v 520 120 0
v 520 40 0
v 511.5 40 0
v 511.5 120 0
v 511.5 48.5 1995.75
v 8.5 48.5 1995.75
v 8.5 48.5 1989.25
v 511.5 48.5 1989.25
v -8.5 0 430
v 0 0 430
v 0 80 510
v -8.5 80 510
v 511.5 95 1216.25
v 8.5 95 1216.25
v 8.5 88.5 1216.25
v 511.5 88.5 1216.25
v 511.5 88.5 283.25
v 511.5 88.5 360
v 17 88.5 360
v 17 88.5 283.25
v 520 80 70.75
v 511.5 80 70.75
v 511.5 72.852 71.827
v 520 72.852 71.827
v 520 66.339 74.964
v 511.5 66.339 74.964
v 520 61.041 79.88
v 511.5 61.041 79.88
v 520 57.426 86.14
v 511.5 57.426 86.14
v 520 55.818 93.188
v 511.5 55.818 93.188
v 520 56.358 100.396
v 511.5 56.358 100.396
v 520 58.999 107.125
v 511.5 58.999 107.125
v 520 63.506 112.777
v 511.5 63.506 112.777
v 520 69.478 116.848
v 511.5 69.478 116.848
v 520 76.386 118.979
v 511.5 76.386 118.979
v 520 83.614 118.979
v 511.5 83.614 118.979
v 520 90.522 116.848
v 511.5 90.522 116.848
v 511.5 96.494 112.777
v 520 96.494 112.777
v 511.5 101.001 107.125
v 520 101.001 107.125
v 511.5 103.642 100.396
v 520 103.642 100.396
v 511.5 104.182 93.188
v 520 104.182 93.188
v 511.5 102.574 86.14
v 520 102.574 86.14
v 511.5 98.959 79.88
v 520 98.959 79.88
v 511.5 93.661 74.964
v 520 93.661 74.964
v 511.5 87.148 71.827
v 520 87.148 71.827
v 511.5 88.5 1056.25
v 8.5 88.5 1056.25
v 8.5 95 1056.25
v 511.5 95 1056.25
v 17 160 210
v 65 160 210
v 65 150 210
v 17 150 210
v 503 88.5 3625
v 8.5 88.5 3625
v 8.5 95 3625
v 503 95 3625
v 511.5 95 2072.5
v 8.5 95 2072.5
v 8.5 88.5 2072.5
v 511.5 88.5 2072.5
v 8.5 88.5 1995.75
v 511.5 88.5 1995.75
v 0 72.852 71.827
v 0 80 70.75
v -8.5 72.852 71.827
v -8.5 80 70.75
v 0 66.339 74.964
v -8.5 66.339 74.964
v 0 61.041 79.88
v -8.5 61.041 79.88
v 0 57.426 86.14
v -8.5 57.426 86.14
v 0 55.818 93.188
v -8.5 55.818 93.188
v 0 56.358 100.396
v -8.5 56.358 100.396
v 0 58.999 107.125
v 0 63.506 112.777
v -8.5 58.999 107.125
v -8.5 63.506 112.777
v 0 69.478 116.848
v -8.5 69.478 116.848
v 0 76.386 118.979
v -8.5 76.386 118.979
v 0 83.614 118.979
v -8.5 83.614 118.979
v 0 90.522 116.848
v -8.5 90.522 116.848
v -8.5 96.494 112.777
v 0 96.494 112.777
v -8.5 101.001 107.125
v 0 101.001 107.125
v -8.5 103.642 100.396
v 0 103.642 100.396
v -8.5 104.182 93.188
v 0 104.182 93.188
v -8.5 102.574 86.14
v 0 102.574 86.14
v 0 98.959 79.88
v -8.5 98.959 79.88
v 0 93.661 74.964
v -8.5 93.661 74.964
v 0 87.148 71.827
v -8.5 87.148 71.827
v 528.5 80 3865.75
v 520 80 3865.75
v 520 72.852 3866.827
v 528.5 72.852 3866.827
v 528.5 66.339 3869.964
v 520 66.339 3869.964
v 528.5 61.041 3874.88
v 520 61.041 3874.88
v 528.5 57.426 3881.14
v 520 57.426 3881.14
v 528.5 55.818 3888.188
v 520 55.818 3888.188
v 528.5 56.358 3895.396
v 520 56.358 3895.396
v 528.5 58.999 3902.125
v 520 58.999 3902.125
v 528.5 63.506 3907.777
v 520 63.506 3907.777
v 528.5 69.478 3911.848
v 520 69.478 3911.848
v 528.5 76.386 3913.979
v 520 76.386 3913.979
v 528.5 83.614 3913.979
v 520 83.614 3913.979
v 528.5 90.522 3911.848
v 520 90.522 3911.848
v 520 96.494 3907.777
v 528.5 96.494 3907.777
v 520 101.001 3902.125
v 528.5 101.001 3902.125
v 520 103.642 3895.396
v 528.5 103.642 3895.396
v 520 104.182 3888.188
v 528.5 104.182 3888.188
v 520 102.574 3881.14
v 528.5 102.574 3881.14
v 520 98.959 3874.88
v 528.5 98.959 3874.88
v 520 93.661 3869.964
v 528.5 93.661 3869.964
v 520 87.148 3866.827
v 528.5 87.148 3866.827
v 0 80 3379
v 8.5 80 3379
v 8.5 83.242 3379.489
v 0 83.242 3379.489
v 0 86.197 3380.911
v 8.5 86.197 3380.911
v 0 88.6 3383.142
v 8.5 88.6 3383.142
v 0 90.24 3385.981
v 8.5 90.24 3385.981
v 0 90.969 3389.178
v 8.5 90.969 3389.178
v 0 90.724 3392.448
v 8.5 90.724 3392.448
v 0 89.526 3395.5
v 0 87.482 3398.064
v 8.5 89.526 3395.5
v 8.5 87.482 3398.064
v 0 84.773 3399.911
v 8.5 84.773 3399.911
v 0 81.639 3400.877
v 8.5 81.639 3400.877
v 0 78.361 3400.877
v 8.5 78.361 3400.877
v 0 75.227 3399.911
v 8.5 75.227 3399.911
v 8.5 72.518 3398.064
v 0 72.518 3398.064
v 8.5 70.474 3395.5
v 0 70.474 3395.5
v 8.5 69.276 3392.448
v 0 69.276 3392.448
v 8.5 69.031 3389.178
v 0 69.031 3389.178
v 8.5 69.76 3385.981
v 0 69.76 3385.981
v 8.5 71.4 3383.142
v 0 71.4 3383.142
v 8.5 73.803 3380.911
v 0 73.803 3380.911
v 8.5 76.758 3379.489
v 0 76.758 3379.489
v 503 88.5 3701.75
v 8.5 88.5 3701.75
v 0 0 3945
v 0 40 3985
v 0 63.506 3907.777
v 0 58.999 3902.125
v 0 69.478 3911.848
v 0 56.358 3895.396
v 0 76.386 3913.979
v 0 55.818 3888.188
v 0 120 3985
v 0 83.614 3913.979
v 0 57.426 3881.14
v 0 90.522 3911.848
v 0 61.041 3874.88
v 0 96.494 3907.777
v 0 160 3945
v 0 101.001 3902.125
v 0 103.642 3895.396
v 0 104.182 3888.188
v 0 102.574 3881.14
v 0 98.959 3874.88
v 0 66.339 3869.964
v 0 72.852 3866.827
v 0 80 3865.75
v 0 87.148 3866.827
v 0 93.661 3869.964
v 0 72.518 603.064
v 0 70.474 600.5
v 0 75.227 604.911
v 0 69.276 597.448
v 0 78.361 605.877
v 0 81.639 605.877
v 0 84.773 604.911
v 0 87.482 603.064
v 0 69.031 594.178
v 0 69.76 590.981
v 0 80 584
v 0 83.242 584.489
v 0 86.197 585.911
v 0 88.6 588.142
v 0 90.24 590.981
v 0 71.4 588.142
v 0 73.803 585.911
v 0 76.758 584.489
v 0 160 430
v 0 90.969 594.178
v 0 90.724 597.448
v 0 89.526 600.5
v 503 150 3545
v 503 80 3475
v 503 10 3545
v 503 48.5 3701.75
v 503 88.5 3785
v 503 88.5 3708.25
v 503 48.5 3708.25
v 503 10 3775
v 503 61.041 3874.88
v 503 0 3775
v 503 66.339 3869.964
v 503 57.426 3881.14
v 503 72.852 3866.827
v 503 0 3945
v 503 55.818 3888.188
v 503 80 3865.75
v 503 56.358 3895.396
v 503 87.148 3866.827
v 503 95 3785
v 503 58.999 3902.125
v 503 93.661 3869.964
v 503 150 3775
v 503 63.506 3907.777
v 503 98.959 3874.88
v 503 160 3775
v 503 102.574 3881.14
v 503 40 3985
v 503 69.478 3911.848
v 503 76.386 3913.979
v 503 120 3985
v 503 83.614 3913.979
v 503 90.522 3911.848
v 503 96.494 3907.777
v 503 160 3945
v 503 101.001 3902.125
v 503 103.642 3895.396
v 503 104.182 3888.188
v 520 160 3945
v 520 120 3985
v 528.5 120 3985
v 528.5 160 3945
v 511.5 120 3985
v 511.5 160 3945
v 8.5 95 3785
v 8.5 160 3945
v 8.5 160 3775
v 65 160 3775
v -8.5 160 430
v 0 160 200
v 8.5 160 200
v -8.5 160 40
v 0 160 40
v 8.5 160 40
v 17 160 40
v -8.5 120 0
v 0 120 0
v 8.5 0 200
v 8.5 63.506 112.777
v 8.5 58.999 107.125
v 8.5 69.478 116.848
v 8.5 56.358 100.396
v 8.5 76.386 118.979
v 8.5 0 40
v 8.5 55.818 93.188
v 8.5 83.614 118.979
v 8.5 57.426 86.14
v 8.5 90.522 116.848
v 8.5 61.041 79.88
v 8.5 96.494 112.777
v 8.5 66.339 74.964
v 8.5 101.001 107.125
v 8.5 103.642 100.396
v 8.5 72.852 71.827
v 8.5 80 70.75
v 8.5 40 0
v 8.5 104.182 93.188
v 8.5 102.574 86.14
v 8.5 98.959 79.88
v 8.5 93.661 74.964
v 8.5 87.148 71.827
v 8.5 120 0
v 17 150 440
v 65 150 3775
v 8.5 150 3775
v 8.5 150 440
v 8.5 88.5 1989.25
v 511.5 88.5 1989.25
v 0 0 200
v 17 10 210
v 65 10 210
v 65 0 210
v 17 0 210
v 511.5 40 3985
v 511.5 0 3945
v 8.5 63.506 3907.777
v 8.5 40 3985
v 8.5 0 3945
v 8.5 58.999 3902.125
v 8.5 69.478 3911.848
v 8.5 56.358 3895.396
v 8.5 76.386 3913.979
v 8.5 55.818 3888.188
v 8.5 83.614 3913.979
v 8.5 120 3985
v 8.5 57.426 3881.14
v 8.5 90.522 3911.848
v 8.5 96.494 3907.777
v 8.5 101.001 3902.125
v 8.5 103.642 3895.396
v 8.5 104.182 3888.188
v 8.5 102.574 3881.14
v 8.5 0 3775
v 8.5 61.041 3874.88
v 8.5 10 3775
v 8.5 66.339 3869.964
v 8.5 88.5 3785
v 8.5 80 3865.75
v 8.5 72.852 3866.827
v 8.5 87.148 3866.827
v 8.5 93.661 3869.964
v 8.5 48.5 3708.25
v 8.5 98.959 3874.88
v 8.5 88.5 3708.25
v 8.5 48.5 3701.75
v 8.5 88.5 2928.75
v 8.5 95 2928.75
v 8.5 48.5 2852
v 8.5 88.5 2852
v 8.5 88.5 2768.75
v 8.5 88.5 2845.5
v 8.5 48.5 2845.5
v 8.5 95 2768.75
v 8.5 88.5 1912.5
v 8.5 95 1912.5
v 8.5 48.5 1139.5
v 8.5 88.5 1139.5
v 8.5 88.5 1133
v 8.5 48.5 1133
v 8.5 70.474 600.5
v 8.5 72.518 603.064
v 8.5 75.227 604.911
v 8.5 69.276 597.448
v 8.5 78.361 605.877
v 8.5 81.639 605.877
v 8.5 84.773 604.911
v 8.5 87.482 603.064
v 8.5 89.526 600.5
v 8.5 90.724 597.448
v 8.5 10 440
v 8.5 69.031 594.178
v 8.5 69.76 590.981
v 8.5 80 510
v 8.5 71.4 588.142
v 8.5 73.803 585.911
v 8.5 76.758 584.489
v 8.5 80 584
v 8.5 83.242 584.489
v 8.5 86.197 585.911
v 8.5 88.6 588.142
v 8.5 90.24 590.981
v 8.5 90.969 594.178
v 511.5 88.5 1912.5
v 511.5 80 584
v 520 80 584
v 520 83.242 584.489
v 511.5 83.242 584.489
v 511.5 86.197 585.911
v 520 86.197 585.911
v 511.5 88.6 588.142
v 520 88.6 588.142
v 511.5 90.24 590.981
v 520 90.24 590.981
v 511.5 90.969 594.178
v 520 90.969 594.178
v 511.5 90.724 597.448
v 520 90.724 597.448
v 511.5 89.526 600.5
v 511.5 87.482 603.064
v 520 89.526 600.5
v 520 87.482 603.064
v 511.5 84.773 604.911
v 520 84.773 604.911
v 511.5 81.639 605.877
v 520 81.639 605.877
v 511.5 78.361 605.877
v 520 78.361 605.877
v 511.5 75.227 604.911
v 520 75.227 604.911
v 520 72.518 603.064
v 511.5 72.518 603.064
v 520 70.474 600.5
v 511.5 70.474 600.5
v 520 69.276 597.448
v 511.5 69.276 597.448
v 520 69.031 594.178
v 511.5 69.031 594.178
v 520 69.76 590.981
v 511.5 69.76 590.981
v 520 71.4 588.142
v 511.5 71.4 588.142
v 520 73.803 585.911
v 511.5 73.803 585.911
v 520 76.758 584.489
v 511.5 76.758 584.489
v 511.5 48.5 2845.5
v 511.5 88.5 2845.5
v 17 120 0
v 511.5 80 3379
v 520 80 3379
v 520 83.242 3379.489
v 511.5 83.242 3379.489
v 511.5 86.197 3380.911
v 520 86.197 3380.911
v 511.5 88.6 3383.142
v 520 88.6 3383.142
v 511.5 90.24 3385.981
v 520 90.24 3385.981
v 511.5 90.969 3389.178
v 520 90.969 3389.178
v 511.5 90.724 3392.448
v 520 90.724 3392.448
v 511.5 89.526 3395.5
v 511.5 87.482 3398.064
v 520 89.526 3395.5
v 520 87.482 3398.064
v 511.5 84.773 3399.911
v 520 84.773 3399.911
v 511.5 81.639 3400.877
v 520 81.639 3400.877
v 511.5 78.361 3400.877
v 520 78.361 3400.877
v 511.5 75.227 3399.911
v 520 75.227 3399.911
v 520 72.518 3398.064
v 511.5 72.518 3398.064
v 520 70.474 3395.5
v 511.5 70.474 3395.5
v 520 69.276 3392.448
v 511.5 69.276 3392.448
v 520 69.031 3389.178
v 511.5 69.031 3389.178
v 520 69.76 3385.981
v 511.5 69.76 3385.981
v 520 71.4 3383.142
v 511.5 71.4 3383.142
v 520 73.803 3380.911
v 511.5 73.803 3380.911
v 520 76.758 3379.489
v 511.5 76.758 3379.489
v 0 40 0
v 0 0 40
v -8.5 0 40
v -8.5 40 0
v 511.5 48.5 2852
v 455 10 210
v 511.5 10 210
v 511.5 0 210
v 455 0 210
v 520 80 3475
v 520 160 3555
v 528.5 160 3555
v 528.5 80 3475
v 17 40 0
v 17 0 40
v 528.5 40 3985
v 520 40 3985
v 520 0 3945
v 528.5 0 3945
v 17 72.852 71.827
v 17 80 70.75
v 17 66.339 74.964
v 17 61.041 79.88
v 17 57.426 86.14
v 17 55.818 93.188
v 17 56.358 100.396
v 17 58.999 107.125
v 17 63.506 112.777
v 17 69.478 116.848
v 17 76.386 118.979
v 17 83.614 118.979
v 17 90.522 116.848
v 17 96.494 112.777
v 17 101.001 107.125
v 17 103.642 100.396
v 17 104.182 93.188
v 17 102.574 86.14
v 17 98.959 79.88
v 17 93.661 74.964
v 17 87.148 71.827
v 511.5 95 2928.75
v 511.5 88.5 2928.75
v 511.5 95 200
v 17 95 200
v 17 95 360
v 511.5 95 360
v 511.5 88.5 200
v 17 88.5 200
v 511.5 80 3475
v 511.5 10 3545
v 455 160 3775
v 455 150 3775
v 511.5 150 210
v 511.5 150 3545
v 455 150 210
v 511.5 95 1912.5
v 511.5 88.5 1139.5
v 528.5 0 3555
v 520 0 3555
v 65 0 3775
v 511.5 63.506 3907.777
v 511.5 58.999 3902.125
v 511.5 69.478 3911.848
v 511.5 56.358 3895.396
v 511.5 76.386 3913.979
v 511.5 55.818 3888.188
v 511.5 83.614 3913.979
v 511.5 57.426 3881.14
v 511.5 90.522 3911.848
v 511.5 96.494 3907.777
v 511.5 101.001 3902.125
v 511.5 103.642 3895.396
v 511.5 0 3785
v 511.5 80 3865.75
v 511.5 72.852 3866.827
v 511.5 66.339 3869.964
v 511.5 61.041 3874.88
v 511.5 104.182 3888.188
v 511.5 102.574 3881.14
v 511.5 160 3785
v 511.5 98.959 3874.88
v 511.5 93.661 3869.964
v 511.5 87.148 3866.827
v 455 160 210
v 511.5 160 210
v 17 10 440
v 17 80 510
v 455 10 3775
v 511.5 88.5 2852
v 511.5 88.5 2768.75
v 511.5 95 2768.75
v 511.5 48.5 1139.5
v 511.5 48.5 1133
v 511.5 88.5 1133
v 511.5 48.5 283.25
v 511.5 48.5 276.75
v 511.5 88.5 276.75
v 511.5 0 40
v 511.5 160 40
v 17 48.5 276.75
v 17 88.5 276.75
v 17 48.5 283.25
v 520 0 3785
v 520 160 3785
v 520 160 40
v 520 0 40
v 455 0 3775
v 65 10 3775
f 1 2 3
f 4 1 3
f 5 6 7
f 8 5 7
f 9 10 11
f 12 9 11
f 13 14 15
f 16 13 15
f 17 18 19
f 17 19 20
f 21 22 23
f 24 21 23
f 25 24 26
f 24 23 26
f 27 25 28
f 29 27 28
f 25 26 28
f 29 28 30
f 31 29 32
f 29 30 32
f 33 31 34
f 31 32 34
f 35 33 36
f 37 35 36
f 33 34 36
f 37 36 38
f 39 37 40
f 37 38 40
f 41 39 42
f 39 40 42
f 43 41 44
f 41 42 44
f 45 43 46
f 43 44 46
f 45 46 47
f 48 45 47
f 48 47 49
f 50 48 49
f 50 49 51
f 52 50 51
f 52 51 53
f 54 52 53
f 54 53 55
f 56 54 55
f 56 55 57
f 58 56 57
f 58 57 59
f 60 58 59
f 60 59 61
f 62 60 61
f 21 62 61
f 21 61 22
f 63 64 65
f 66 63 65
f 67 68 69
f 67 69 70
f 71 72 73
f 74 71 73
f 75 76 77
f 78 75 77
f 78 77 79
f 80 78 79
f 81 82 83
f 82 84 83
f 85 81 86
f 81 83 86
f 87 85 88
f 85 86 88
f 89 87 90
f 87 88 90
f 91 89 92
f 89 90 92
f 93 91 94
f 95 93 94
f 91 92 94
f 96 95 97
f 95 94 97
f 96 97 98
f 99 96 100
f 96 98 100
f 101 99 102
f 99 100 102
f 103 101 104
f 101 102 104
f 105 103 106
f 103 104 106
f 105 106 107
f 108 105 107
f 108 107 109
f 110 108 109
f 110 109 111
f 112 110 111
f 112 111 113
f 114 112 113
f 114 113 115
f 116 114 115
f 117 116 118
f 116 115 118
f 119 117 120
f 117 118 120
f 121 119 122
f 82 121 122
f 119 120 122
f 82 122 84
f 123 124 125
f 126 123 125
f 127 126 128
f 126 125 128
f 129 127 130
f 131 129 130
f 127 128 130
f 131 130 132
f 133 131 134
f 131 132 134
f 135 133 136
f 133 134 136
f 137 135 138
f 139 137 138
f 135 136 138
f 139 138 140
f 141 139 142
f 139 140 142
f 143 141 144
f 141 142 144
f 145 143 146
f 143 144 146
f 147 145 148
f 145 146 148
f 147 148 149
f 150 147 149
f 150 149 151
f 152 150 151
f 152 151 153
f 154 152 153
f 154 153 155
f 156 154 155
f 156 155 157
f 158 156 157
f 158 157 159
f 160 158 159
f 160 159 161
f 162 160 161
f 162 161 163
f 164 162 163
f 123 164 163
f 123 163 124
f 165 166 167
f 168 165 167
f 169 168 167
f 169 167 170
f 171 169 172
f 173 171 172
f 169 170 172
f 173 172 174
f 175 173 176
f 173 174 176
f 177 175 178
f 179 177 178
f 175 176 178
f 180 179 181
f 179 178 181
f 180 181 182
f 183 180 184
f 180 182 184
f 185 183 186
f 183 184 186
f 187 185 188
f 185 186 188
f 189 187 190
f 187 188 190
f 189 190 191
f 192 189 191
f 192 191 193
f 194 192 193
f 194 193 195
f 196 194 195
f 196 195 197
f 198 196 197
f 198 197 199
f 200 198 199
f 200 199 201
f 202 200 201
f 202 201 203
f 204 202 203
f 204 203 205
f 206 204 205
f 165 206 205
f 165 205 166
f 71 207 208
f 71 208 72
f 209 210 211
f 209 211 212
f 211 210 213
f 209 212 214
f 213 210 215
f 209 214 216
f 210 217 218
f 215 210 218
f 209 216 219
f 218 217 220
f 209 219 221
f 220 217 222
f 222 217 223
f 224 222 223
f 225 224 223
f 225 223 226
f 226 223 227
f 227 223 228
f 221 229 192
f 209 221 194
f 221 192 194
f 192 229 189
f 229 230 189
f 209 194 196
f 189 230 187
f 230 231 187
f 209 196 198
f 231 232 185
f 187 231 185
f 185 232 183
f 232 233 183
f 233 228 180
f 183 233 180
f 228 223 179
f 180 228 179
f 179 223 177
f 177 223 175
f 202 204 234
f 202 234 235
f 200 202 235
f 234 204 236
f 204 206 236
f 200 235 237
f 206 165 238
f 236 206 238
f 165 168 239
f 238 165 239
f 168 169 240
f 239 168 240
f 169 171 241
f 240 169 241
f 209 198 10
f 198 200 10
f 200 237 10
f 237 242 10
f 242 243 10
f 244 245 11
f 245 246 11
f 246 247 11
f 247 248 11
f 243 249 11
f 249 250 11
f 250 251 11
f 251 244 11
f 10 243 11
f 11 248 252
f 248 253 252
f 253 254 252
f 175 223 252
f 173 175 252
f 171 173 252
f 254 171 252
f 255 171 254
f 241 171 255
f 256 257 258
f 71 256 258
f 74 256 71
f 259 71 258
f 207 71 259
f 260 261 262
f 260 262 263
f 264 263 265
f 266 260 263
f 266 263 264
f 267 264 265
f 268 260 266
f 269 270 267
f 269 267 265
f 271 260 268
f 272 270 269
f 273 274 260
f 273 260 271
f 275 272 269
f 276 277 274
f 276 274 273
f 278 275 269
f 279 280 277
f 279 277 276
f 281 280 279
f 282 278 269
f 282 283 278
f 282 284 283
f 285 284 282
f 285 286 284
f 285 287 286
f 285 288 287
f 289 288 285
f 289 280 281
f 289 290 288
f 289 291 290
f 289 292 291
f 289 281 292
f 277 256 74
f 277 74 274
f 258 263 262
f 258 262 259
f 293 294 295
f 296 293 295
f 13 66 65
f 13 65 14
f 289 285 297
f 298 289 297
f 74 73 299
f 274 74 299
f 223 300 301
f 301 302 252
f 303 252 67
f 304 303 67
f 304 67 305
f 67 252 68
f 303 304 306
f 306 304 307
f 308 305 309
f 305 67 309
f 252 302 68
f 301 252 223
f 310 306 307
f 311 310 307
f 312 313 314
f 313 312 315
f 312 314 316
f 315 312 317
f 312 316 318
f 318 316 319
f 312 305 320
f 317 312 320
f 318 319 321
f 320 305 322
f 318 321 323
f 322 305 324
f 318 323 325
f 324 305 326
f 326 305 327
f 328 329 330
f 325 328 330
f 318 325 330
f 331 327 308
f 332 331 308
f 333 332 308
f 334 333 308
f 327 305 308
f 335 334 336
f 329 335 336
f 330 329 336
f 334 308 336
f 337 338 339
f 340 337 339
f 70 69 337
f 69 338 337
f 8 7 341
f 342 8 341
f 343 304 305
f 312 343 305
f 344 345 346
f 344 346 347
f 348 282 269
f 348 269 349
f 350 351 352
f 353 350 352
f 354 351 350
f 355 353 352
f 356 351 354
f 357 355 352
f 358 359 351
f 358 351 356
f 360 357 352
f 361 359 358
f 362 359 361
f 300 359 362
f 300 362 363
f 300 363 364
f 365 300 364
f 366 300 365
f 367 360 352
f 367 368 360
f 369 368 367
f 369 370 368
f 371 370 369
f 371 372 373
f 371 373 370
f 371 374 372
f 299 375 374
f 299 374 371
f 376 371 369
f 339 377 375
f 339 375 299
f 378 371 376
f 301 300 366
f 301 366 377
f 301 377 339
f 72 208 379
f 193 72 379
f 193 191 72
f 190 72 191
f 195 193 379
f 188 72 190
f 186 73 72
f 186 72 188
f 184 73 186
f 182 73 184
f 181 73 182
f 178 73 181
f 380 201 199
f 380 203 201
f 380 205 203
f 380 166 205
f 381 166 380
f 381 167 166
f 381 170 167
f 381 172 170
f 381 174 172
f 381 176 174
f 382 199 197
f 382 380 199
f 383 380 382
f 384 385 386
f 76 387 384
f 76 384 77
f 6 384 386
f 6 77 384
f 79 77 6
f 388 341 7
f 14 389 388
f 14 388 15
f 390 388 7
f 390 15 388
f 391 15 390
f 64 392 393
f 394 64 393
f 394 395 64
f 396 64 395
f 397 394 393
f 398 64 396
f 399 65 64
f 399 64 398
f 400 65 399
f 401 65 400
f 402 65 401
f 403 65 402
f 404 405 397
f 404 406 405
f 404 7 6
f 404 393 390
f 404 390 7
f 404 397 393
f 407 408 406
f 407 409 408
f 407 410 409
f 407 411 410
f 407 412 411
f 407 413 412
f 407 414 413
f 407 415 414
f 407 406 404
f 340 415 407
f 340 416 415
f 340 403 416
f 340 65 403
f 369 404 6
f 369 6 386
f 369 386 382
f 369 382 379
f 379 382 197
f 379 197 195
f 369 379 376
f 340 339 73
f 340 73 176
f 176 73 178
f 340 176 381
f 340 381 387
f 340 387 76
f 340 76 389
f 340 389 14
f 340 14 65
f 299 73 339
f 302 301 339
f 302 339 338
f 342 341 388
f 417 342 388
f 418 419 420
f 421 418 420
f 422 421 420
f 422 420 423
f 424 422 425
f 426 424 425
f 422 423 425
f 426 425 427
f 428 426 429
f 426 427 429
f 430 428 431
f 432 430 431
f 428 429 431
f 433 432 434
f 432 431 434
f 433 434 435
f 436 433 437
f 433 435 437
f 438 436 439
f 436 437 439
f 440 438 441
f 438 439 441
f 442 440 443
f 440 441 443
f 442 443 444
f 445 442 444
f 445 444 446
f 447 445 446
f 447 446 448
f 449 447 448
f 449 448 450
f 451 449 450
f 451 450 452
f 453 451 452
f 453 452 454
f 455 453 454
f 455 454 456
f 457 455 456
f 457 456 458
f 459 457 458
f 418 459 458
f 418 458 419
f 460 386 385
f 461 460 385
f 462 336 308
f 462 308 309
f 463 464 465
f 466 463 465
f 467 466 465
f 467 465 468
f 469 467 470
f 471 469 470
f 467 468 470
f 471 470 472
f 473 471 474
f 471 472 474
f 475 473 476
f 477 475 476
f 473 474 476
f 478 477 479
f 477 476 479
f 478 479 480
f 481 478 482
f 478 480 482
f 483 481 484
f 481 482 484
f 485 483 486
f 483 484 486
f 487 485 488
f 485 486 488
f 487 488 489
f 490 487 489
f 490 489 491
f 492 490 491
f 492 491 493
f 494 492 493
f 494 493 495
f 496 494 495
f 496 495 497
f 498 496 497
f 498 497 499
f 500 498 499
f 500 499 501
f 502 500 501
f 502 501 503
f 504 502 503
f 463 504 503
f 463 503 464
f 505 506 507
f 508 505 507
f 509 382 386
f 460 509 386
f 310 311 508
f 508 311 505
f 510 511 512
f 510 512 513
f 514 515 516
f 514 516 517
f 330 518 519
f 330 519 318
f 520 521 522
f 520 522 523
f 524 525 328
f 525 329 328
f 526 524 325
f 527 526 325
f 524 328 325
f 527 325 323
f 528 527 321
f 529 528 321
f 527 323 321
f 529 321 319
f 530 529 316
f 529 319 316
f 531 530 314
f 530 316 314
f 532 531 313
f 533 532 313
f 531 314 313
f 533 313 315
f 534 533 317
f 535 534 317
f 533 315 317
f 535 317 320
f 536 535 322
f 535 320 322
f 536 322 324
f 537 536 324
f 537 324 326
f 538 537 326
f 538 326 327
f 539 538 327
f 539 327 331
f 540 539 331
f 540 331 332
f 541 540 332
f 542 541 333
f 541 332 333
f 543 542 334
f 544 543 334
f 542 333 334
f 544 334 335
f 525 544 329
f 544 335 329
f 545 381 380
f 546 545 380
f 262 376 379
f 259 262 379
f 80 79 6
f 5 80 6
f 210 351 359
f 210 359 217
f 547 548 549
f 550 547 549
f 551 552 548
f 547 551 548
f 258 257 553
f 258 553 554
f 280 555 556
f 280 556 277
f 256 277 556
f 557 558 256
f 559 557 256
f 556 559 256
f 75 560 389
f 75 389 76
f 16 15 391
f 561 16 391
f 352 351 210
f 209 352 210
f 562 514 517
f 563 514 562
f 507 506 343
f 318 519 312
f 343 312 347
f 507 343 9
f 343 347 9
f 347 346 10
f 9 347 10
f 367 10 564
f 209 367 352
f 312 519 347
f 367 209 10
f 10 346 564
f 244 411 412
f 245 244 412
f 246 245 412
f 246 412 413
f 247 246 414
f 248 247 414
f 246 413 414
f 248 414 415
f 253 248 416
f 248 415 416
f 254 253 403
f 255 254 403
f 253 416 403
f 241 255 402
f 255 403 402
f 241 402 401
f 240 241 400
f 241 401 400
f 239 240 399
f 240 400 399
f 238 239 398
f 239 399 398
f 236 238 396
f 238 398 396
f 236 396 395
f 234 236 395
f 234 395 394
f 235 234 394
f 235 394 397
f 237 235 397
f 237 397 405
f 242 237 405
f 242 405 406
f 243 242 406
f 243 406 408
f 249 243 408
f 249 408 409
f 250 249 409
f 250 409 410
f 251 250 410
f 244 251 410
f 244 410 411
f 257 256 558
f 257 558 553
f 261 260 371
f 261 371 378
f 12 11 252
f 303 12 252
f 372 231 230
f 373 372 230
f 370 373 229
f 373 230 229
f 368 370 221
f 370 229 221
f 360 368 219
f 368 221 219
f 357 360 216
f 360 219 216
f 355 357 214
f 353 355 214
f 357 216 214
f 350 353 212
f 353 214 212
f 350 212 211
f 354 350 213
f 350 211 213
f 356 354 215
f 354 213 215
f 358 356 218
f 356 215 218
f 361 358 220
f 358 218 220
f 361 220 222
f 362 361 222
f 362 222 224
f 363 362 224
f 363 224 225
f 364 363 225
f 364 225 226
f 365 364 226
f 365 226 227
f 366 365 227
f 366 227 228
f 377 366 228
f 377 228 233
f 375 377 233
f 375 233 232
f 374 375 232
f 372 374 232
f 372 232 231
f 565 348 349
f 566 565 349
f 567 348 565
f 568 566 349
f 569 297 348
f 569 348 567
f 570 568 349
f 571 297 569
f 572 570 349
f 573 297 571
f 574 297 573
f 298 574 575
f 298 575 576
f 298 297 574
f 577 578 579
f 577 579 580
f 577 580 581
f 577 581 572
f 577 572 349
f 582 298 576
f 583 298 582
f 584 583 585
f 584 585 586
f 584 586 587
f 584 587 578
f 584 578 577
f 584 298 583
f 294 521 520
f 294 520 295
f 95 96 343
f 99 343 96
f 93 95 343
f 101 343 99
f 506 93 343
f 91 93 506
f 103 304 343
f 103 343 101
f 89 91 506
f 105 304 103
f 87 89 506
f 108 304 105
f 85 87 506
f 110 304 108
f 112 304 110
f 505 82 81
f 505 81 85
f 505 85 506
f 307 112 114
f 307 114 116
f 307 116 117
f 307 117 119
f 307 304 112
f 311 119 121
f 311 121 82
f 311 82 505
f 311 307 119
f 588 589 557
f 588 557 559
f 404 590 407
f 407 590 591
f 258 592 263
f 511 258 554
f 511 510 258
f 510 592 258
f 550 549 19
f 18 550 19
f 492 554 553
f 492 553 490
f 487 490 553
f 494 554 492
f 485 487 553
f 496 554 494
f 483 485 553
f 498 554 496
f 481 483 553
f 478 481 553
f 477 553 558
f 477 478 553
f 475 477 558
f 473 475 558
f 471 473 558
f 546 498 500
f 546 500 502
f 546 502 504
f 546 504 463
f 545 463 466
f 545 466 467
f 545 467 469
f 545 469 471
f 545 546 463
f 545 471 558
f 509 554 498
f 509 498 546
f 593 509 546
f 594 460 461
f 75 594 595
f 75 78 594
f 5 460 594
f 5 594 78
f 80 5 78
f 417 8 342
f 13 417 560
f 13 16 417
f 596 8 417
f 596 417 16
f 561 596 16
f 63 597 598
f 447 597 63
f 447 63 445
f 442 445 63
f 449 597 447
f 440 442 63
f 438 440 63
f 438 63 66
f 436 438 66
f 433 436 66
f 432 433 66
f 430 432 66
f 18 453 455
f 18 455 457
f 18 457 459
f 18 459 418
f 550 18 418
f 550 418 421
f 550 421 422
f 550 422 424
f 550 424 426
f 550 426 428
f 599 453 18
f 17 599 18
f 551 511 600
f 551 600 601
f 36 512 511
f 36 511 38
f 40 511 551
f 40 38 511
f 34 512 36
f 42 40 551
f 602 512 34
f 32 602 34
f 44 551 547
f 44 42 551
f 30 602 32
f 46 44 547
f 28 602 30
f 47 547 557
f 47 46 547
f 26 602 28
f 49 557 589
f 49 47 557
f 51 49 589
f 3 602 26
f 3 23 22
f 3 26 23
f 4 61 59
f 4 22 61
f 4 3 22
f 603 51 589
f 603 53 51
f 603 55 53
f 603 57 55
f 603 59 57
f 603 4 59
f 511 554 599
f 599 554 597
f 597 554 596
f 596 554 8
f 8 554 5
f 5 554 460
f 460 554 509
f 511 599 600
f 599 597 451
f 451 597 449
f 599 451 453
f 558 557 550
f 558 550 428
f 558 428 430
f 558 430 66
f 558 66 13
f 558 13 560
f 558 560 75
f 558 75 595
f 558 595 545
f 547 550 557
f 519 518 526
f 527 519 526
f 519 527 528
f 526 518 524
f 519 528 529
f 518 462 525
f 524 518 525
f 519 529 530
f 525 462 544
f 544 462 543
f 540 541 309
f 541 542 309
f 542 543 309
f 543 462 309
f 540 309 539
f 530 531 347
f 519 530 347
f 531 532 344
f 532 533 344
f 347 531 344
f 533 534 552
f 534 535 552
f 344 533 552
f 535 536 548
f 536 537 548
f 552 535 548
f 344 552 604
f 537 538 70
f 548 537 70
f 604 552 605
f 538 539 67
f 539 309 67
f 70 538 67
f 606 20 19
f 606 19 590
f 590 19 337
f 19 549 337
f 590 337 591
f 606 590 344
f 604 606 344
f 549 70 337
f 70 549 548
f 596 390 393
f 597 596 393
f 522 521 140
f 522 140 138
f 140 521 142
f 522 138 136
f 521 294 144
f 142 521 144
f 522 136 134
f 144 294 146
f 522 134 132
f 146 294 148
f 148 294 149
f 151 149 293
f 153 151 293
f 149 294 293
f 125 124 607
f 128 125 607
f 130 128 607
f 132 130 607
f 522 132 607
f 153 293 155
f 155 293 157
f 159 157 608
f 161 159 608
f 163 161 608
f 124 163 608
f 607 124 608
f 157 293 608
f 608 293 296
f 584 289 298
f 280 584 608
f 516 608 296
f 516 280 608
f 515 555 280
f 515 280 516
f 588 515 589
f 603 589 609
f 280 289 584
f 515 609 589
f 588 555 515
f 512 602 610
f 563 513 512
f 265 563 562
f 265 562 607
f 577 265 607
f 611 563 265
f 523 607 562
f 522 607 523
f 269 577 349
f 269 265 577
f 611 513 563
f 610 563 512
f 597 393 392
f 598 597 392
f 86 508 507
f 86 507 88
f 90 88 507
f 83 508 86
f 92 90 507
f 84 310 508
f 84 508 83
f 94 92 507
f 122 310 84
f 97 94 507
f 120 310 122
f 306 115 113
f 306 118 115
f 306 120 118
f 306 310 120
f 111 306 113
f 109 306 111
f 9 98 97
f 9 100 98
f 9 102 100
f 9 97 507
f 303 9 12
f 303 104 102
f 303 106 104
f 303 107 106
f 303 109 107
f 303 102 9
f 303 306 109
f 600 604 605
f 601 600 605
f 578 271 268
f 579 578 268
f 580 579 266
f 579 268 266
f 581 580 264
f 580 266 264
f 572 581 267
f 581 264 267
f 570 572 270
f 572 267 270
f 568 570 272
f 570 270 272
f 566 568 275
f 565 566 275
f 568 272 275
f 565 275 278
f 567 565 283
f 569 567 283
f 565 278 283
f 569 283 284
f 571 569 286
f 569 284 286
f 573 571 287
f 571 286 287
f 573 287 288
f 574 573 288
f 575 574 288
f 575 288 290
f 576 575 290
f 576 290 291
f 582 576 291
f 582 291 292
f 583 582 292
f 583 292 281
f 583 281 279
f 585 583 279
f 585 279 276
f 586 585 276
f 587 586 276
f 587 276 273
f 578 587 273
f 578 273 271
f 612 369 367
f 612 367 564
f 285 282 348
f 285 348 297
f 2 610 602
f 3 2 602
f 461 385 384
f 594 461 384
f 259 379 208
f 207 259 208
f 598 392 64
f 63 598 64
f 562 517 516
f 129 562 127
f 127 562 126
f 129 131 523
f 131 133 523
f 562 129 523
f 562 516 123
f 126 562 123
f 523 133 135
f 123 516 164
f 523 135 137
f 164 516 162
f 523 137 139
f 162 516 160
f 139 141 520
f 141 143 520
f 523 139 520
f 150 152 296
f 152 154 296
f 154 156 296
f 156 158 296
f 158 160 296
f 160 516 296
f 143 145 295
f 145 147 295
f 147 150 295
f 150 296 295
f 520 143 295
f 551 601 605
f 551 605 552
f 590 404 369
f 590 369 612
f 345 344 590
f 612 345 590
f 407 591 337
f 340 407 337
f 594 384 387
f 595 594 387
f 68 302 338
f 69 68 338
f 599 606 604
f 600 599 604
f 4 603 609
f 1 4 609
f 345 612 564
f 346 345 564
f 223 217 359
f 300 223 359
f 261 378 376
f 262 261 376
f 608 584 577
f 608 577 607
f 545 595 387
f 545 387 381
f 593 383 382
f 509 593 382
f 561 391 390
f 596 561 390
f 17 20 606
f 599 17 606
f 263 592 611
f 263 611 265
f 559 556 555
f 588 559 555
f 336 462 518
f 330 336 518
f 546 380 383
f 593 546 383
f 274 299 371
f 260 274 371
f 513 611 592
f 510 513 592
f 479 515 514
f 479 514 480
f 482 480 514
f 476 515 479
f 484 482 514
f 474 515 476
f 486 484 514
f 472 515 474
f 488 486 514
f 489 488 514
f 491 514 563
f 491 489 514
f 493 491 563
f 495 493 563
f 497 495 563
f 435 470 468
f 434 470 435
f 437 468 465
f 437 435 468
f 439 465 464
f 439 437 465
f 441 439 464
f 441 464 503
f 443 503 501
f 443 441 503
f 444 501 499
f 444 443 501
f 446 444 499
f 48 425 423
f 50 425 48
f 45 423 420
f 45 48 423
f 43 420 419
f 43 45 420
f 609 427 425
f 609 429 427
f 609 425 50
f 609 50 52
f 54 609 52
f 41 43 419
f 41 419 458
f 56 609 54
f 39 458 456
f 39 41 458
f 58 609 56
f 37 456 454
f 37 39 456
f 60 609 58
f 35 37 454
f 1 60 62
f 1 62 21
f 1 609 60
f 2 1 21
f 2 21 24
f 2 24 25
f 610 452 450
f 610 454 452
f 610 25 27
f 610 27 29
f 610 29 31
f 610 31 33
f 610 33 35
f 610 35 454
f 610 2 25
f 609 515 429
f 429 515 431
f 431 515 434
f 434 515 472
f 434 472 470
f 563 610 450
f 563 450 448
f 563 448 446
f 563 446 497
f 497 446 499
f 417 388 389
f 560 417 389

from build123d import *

# Parameters (mm, degrees)
EXTRUDE_1_DEPTH        = 3985
EXTRUDE_1_2_DEPTH      = 3985
EXTRUDE_3_DEPTH        = 520
SKETCH_6_W             = 503
SKETCH_6_H             = 200
CUT_EXTRUDE_4_DEPTH    = 4022.96780196
PATTERN_LINEAR_1_COUNT = 5
PATTERN_LINEAR_1_PITCH = 856.25
EXTRUDE_11_DEPTH       = 8.5
PATTERN_LINEAR_2_COUNT = 2
PATTERN_LINEAR_2_PITCH = 17
SKETCH_22_W            = 8.5
SKETCH_22_H            = 200
CUT_EXTRUDE_12_DEPTH   = 4024.075595859
SKETCH_23_R            = 24.25
CUT_EXTRUDE_13_DEPTH   = 4024.075595859
EXTRUDE_14_DEPTH       = 8.5
PATTERN_LINEAR_3_COUNT = 2
PATTERN_LINEAR_3_PITCH = 17
SKETCH_27_W            = 8.5
SKETCH_27_H            = 200
CUT_EXTRUDE_15_DEPTH   = 4024.075595859
SKETCH_28_R            = 24.25
CUT_EXTRUDE_16_DEPTH   = 4025.201038716
SKETCH_29_W            = 494.5
SKETCH_29_H            = 10
CUT_EXTRUDE_17_DEPTH   = 10
SKETCH_30_W            = 494.5
SKETCH_30_H            = 10
CUT_EXTRUDE_18_DEPTH   = 10
SKETCH_31_R            = 11
CUT_EXTRUDE_19_DEPTH   = 4024.075595859
CHAMFER_1_SIZE         = 40


with BuildPart() as part:
    # 草图2 → 拉伸1 (new body)
    with BuildSketch(Plane.XY):
        Polygon((0, 0), (0, 160), (65, 160), (65, 150), (8.5, 150), (8.5, 10), (65, 10), (65, 0), align=None)
    extrude(amount=EXTRUDE_1_DEPTH)



with BuildPart() as body_2:
    # 草图2 → Extrude 1 2 (new body)
    with BuildSketch(Plane.XY):
        Polygon((455, 160), (520, 160), (520, 0), (455, 0), (455, 10), (511.5, 10), (511.5, 150), (455, 150), align=None)
    extrude(amount=EXTRUDE_1_2_DEPTH)


with BuildPart() as part_1:
    add(part.part)

    add(body_2.part)  # 拉伸3 merges body 2
    # 草图5 → 拉伸3 (add)
    with BuildSketch(Plane.ZY):
        Polygon((200, 95), (360, 95), (360, 88.5), (283.25, 88.5), (283.25, 48.5), (276.75, 48.5), (276.75, 88.5), (200, 88.5), align=None)
    extrude_3 = extrude(amount=-EXTRUDE_3_DEPTH)

    # 草图6 → 拉伸4 (cut, through all)
    with BuildSketch(Plane(origin=(0, 160, 0), x_dir=(1, 0, 0), z_dir=(0, 1, 0))):
        with Locations((260, -100)):
            Rectangle(SKETCH_6_W, SKETCH_6_H)
        with Locations((260, -3885)):
            Rectangle(SKETCH_6_W, SKETCH_6_H)
    extrude(amount=-CUT_EXTRUDE_4_DEPTH, mode=Mode.SUBTRACT)

    # 阵列(线性)1: 拉伸3 ×5
    with Locations(*[(0, 0, i * PATTERN_LINEAR_1_PITCH) for i in range(1, PATTERN_LINEAR_1_COUNT)]):
        add(extrude_3)

    # 草图19 → 拉伸11 (add)
    with BuildSketch(Plane(origin=(520, 0, 0), x_dir=(0, 0, -1), z_dir=(1, 0, 0))):
        Polygon((-3985, 160), (-3555, 160), (-3475, 80), (-3555, 0), (-3985, 0), align=None)
    extrude_11 = extrude(amount=EXTRUDE_11_DEPTH)

    # 阵列(线性)2: 拉伸11 ×2
    with Locations(*[(-i * PATTERN_LINEAR_2_PITCH, 0, 0) for i in range(1, PATTERN_LINEAR_2_COUNT)]):
        add(extrude_11)

    # 草图22 → 拉伸12 (cut, through all)
    with BuildSketch(Plane(origin=(0, 160, 0), x_dir=(1, 0, 0), z_dir=(0, 1, 0))):
        with Locations((515.75, -3885)):
            Rectangle(SKETCH_22_W, SKETCH_22_H)
    extrude(amount=-CUT_EXTRUDE_12_DEPTH, mode=Mode.SUBTRACT)

    # 草图23 → 拉伸13 (cut, through all)
    with BuildSketch(Plane.ZY):
        with Locations(Location((95, 80, 0), (0, 0, 180))):
            Circle(SKETCH_23_R)
        with Locations(Location((3890, 80, 0), (0, 0, 180))):
            Circle(SKETCH_23_R)
    extrude(amount=-CUT_EXTRUDE_13_DEPTH, mode=Mode.SUBTRACT)

    # 草图26 → 拉伸14 (add)
    with BuildSketch(Plane.ZY):
        Polygon((0, 160), (0, 0), (430, 0), (510, 80), (430, 160), align=None)
    extrude_14 = extrude(amount=EXTRUDE_14_DEPTH)

    # 阵列(线性)3: 拉伸14 ×2
    with Locations(*[(i * PATTERN_LINEAR_3_PITCH, 0, 0) for i in range(1, PATTERN_LINEAR_3_COUNT)]):
        add(extrude_14)

    # 草图27 → 拉伸15 (cut, through all)
    with BuildSketch(Plane(origin=(0, 160, 0), x_dir=(1, 0, 0), z_dir=(0, 1, 0))):
        with Locations((4.25, -100)):
            Rectangle(SKETCH_27_W, SKETCH_27_H)
    extrude(amount=-CUT_EXTRUDE_15_DEPTH, mode=Mode.SUBTRACT)

    # 草图28 → 拉伸16 (cut, through all)
    with BuildSketch(Plane.ZY.offset(8.5)):
        with Locations(Location((95, 80, 0), (0, 0, 180))):
            Circle(SKETCH_28_R)
    extrude(amount=-CUT_EXTRUDE_16_DEPTH, mode=Mode.SUBTRACT)

    # 草图29 → 拉伸17 (cut)
    with BuildSketch(Plane.XY.offset(3785)):
        with Locations((255.75, 155)):
            Rectangle(SKETCH_29_W, SKETCH_29_H)
        with Locations((255.75, 5)):
            Rectangle(SKETCH_29_W, SKETCH_29_H)
    extrude(amount=-CUT_EXTRUDE_17_DEPTH, mode=Mode.SUBTRACT)

    # 草图30 → 拉伸18 (cut)
    with BuildSketch(Plane(origin=(0, 0, 200), x_dir=(-1, 0, 0), z_dir=(0, 0, -1))):
        with Locations((-264.25, 155)):
            Rectangle(SKETCH_30_W, SKETCH_30_H)
        with Locations((-264.25, 5)):
            Rectangle(SKETCH_30_W, SKETCH_30_H)
    extrude(amount=-CUT_EXTRUDE_18_DEPTH, mode=Mode.SUBTRACT)

    # 草图31 → 拉伸19 (cut, through all)
    with BuildSketch(Plane(origin=(520, 0, 0), x_dir=(0, 0, -1), z_dir=(1, 0, 0))):
        with Locations((-595, 80)):
            Circle(SKETCH_31_R)
        with Locations((-3390, 80)):
            Circle(SKETCH_31_R)
    extrude(amount=-CUT_EXTRUDE_19_DEPTH, mode=Mode.SUBTRACT)

    # 倒角1
    chamfer_1_edges = [part_1.edges().sort_by_distance(p)[0] for p in [
        (-4.25, 0, 0),
        (507.25, 0, 3985),
        (4.25, 160, 3985),
        (4.25, 0, 3985),
        (507.25, 160, 3985),
        (524.25, 0, 3985),
        (-4.25, 160, 0),
        (12.75, 0, 0),
        (515.75, 160, 0),
        (524.25, 160, 3985),
        (515.75, 0, 0),
        (12.75, 160, 0),
    ]]
    chamfer(chamfer_1_edges, length=CHAMFER_1_SIZE)


solid = part_1.part
